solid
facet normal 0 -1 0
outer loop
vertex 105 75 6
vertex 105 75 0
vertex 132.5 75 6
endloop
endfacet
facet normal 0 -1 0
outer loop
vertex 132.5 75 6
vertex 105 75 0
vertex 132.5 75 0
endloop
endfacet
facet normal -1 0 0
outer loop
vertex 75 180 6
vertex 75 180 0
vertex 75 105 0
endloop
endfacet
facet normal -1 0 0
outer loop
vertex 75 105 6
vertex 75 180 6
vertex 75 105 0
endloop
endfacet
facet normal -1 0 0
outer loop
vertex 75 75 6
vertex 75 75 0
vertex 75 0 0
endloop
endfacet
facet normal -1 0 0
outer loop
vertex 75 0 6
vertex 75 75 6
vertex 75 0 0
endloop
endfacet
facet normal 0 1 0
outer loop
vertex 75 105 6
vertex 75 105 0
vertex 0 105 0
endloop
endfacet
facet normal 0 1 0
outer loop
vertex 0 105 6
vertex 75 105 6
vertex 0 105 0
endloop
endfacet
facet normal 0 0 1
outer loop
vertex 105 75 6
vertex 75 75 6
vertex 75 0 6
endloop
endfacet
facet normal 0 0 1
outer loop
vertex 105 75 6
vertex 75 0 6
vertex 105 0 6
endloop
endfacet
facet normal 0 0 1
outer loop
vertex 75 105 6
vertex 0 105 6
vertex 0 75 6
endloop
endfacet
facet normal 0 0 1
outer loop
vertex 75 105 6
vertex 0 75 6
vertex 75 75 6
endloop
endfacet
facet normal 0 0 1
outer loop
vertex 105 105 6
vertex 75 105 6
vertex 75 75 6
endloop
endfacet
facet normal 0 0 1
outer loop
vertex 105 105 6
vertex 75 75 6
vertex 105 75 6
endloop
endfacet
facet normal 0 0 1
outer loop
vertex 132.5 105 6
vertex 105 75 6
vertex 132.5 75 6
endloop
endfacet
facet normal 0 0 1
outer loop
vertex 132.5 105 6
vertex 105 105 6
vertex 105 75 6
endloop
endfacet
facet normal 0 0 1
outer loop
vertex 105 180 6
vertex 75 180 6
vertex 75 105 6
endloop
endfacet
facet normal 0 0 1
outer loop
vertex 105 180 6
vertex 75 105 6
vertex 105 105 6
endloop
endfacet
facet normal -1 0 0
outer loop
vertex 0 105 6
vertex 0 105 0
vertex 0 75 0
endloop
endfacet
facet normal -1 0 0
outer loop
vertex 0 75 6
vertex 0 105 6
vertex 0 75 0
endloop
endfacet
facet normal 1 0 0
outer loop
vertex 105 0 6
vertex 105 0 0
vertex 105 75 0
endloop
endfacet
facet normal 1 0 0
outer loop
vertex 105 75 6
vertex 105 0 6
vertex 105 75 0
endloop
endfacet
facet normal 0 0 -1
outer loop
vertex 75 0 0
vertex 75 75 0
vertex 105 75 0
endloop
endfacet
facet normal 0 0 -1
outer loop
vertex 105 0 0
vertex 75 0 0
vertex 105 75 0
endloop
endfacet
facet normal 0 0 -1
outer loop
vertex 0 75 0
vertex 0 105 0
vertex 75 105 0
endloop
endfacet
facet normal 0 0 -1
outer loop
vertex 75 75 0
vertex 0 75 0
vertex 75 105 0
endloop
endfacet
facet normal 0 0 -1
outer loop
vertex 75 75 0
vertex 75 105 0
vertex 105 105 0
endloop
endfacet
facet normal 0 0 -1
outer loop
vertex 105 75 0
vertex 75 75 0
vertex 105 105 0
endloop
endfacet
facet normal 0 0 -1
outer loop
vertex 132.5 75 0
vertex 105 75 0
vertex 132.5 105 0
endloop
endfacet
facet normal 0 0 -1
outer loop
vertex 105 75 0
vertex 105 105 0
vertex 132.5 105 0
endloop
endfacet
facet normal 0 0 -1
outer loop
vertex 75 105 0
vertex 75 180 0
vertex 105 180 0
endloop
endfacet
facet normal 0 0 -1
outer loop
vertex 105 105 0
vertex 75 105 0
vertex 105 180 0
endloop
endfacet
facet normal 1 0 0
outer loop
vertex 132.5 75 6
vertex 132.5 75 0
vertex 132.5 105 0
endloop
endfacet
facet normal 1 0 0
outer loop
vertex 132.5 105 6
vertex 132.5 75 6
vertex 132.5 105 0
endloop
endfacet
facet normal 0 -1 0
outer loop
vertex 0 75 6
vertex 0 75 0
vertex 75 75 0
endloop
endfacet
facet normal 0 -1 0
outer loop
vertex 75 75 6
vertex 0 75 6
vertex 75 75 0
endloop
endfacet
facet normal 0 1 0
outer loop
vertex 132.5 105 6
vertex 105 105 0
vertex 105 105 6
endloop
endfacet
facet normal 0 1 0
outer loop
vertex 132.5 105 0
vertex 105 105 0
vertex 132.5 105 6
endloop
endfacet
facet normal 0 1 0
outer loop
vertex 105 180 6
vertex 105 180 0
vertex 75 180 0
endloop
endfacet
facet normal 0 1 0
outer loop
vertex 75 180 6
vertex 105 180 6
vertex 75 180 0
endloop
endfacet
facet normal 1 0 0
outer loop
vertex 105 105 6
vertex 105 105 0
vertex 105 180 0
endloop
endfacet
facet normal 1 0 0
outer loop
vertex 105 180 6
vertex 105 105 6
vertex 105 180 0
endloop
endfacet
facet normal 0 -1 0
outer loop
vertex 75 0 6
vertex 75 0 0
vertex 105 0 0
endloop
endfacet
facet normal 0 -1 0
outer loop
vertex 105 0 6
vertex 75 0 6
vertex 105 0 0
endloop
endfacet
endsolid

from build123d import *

# Parameters (mm, degrees)
ESBO_O1_W                = 27.5
ESBO_O1_H                = 30
RESSALTO_EXTRUS_O1_DEPTH = 6


with BuildPart() as part:
    # Esboço1 → Ressalto-extrusão1 (new body)
    with BuildSketch(Plane.XY):
        Polygon((75, 75), (75, 0), (105, 0), (105, 75), (105, 105), (105, 180), (90, 180), (75, 180), (75, 105), (0, 105), (0, 75), align=None)
        with Locations((118.75, 90)):
            Rectangle(ESBO_O1_W, ESBO_O1_H)
    extrude(amount=RESSALTO_EXTRUS_O1_DEPTH)


solid = part.part
